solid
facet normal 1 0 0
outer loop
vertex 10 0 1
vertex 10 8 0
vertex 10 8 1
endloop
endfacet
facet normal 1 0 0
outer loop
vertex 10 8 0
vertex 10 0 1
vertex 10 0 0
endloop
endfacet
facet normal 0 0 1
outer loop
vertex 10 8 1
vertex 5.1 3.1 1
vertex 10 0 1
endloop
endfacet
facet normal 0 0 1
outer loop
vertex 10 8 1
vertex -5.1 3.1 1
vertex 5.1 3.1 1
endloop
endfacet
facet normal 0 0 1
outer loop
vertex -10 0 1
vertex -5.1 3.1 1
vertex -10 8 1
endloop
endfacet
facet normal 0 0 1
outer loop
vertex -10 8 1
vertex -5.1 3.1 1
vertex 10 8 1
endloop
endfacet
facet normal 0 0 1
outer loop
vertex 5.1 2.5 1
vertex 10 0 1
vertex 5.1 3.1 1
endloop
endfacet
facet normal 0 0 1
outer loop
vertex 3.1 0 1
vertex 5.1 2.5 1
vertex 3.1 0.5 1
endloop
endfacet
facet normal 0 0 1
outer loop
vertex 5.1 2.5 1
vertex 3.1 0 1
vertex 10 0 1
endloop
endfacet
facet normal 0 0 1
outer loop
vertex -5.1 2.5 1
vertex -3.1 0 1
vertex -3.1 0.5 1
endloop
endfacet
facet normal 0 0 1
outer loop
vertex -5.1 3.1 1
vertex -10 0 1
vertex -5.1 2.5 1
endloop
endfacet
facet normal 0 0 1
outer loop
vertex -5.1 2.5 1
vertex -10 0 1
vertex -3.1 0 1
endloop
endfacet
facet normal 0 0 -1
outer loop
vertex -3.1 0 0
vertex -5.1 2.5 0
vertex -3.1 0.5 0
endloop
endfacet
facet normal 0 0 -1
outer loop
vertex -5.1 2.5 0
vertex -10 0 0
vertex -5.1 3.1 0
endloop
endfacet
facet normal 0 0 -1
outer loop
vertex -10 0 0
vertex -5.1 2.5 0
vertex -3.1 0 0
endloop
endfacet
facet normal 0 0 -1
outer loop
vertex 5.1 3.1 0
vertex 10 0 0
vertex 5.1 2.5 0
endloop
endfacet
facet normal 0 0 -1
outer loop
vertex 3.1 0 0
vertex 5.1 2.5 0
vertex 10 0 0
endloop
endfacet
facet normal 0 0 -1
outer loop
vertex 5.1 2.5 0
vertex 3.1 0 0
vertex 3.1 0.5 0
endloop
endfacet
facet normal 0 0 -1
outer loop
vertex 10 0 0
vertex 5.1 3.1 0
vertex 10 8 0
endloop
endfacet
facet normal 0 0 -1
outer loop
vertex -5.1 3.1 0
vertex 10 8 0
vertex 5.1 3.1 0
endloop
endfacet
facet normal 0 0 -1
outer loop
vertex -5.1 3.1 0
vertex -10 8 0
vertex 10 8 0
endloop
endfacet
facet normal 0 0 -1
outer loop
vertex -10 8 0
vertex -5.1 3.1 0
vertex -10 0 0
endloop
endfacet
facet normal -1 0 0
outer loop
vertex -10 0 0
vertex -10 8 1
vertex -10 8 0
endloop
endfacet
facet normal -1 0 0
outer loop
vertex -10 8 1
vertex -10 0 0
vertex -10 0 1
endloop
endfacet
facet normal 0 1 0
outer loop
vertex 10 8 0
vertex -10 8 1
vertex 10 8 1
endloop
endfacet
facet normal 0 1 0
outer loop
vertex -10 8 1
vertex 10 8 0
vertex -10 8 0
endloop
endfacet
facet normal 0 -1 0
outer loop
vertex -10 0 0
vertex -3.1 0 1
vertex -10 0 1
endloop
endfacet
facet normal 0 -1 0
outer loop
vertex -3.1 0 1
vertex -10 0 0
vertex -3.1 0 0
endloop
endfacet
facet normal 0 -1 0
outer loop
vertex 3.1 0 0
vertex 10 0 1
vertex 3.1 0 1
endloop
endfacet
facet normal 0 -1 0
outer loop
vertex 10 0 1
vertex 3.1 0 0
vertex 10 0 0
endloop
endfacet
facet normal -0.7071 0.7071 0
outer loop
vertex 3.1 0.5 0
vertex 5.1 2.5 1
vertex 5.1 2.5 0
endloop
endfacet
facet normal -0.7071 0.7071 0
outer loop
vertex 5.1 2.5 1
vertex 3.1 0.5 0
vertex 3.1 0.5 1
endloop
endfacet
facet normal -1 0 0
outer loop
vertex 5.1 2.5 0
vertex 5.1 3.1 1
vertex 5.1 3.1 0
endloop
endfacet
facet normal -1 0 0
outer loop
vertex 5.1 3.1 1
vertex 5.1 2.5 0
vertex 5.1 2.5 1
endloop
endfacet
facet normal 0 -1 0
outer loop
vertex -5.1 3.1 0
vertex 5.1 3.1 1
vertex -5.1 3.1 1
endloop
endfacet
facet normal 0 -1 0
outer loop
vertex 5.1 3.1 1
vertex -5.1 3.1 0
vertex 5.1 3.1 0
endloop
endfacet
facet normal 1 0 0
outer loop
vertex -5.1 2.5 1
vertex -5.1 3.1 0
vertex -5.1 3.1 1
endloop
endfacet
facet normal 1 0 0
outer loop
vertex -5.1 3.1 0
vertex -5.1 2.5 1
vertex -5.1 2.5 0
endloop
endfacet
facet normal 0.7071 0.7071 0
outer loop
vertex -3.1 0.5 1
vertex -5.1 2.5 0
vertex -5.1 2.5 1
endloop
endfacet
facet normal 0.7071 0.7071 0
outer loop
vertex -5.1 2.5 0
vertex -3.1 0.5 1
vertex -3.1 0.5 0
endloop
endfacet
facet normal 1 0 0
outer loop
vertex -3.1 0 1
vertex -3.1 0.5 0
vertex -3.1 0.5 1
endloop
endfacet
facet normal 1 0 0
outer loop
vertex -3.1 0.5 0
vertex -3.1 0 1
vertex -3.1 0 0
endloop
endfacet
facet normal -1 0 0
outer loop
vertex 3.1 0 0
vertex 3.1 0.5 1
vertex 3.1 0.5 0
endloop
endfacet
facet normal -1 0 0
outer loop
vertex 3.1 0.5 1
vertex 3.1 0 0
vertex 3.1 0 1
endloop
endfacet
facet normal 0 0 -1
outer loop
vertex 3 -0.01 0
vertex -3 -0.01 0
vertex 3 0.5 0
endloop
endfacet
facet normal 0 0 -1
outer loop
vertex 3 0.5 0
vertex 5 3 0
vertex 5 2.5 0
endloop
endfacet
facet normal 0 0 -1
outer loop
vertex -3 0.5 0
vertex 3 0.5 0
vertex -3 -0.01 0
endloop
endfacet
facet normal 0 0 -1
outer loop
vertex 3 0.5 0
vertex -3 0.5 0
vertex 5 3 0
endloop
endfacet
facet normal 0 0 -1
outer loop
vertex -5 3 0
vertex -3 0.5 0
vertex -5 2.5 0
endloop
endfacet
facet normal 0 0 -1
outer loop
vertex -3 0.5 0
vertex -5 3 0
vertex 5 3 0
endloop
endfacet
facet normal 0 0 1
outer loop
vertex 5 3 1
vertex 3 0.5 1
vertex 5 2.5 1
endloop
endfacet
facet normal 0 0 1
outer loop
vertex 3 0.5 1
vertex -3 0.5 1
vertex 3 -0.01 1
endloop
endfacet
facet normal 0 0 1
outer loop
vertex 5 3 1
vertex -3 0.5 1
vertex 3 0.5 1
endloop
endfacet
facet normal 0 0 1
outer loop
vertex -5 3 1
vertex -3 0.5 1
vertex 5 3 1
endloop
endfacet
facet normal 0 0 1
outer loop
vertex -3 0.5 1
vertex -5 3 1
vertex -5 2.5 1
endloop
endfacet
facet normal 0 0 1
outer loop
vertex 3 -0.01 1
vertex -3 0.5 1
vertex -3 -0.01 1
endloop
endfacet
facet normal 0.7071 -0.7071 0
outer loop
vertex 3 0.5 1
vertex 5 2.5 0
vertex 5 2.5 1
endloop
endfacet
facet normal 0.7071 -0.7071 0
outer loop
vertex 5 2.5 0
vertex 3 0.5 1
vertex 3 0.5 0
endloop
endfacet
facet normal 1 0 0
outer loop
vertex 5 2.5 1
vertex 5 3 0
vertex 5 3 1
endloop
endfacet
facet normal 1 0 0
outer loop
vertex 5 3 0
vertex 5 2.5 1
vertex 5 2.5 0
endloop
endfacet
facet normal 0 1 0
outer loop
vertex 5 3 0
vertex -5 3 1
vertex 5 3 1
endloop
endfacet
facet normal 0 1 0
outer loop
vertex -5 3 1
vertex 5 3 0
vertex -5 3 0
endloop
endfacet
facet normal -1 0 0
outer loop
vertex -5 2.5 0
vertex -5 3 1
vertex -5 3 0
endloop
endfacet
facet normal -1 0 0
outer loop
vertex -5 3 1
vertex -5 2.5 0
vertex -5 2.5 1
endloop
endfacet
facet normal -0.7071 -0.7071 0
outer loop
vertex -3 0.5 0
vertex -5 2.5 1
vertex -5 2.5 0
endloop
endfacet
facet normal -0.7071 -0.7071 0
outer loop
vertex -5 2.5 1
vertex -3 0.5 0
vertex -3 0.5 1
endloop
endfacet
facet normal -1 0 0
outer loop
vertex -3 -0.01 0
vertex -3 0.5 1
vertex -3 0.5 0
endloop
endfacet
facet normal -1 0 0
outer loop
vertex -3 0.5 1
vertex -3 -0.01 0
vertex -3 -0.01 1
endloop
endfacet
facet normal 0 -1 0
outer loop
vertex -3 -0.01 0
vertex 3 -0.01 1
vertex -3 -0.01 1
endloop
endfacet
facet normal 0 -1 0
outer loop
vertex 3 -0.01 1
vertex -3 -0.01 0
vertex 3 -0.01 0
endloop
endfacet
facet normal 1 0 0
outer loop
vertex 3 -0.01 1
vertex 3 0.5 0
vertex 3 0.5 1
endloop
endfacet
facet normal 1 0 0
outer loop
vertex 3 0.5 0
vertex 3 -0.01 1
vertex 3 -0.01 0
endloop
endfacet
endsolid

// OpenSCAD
module connector_polygon(width = 6, depth = 3, edge = 0.5, gap = 0, overlap = 0.01) {
	polygon([
		[-width/2-gap, -overlap],
		[width/2+gap, -overlap],
		[width/2+gap, edge],
		[width/2+depth-2*edge+gap, depth-edge],
		[width/2+depth-2*edge+gap, depth+gap],
		[-width/2-depth+2*edge-gap, depth+gap],
		[-width/2-depth+2*edge-gap, depth-edge],
		[-width/2-gap, edge]
	]);
}

module connector(width = 6, depth = 3, edge = 0.5, h = 1) {
	linear_extrude(height = h)
		connector_polygon(width = width, depth = depth, edge = edge, gap = 0);
}

module connector_cut(width = 6, depth = 3, edge = 0.5, gap = 0.2, h = 1) {
	translate([0, 0, -gap])
		linear_extrude(height = h + 2 * gap)
			connector_polygon(width = width, depth = depth, edge = edge, gap = gap);
}

color("green") connector();
translate([-10, 0, 0]) difference() {
	cube([20, 8, 1]);
	translate([10, 0, 0]) connector_cut(h = 1, gap = 0.1);
}
